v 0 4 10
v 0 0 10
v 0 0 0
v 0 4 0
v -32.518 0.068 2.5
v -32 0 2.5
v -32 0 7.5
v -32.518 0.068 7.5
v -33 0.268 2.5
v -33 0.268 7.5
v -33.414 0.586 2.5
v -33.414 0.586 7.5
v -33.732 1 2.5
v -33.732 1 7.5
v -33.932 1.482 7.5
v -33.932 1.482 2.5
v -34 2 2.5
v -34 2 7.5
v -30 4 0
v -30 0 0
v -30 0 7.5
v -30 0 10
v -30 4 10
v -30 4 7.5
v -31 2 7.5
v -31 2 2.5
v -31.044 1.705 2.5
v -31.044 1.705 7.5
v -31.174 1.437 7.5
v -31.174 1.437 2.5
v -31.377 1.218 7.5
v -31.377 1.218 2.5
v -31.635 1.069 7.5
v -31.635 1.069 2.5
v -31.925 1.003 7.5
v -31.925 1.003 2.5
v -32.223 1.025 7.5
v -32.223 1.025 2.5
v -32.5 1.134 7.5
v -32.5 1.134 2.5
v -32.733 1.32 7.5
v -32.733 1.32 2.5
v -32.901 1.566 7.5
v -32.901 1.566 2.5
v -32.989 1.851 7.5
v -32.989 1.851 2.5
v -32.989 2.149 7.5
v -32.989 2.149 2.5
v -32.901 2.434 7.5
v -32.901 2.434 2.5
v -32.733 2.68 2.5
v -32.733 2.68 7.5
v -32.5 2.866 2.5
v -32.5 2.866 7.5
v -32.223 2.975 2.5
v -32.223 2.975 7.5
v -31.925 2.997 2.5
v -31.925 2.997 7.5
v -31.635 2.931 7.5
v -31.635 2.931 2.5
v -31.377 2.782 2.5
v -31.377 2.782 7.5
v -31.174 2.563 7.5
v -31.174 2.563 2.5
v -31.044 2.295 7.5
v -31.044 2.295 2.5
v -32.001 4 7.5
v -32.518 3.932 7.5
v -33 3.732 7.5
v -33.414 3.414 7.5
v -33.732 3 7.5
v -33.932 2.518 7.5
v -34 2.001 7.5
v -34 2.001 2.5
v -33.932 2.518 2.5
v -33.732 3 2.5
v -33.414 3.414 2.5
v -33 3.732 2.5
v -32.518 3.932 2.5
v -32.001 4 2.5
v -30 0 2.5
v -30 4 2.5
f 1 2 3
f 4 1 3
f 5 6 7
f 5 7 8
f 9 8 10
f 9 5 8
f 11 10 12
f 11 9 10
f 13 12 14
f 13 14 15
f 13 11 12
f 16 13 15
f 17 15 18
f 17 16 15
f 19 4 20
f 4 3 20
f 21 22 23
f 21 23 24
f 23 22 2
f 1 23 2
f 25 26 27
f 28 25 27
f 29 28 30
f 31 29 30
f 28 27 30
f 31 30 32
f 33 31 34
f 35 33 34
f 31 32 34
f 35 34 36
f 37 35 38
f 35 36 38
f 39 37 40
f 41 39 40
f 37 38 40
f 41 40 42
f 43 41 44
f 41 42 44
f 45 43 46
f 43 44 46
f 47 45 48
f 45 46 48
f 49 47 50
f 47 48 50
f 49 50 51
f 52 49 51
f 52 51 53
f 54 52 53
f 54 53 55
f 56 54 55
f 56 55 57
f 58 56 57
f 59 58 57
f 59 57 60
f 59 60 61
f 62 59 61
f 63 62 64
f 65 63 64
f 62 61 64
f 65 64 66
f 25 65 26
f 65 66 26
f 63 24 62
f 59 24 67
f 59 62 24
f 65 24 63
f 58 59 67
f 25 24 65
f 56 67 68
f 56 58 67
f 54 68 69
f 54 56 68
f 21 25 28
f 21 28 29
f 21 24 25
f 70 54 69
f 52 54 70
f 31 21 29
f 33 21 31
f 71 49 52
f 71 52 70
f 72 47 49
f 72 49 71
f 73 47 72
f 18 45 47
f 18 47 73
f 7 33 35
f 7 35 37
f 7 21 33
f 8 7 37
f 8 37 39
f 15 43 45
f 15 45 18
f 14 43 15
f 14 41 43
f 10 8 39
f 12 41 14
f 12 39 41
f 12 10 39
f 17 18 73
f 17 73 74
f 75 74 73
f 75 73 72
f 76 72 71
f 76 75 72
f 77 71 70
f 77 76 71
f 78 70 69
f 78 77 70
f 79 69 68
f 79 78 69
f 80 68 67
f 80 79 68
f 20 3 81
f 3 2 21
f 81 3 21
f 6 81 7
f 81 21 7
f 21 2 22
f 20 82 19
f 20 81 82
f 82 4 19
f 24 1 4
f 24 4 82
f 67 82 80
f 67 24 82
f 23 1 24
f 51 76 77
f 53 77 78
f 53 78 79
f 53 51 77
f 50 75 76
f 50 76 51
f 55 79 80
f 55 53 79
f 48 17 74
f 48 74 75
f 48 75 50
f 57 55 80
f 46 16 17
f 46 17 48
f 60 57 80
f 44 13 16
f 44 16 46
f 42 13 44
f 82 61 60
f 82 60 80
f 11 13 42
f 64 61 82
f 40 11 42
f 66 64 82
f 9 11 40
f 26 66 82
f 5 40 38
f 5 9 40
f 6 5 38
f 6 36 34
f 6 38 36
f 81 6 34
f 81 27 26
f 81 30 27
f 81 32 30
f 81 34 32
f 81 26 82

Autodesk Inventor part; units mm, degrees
ref_plane "YZ Plane" through (0, 0, 0) normal (1, 0, 0) x (0, 1, 0)
ref_plane "XZ Plane" through (0, 0, 0) normal (0, 1, 0) x (-1, 0, 0)
ref_plane "XY Plane" through (0, 0, 0) normal (0, 0, 1) x (1, 0, 0)
sketch "スケッチ1" plane through (0, 0, 0) normal (0, 1, 0) x (-1, 0, 0)
  line L0 (0, 0) -> (30, 0)
  line L1 (30, 10) -> (0, 10)
  line L2 (0, 10) -> (0, 0)
  line L3 (30, 7.5) -> (34, 7.5)
  line L4 (34, 7.5) -> (34, 2.5)
  line L5 (34, 2.5) -> (30, 2.5)
  line L6 (30, 10) -> (30, 7.5)
  line L7 (30, 2.5) -> (30, 0)
  dimension "d0" = 30
  dimension "d1" = 10
  dimension "d5" = 5
  dimension "d6" = 2.5
extrude "押し出し1" add sketch "スケッチ1" along normal blind 4
sketch "スケッチ2" plane through (0, 0, 0) normal (0, 0, 1) x (1, 0, 0)
  circle A0 centre (-32, 2) radius 1
  line L0 (-34, 4) -> (-30, 4) projected
  line L1 (-34, 0) -> (-34, 4) projected
  point P0 (0, 0)
  dimension "d7" = 2
  dimension "d8" = 2
  dimension "d9" = 2
extrude "押し出し2" cut sketch "スケッチ2" along normal blind 10
fillet "フィレット1" radius 2 1 edges at (-34, 0, 5)
fillet "フィレット2" radius 2 1 edges at (-34, 4, 5)
properties part number "promo3"
